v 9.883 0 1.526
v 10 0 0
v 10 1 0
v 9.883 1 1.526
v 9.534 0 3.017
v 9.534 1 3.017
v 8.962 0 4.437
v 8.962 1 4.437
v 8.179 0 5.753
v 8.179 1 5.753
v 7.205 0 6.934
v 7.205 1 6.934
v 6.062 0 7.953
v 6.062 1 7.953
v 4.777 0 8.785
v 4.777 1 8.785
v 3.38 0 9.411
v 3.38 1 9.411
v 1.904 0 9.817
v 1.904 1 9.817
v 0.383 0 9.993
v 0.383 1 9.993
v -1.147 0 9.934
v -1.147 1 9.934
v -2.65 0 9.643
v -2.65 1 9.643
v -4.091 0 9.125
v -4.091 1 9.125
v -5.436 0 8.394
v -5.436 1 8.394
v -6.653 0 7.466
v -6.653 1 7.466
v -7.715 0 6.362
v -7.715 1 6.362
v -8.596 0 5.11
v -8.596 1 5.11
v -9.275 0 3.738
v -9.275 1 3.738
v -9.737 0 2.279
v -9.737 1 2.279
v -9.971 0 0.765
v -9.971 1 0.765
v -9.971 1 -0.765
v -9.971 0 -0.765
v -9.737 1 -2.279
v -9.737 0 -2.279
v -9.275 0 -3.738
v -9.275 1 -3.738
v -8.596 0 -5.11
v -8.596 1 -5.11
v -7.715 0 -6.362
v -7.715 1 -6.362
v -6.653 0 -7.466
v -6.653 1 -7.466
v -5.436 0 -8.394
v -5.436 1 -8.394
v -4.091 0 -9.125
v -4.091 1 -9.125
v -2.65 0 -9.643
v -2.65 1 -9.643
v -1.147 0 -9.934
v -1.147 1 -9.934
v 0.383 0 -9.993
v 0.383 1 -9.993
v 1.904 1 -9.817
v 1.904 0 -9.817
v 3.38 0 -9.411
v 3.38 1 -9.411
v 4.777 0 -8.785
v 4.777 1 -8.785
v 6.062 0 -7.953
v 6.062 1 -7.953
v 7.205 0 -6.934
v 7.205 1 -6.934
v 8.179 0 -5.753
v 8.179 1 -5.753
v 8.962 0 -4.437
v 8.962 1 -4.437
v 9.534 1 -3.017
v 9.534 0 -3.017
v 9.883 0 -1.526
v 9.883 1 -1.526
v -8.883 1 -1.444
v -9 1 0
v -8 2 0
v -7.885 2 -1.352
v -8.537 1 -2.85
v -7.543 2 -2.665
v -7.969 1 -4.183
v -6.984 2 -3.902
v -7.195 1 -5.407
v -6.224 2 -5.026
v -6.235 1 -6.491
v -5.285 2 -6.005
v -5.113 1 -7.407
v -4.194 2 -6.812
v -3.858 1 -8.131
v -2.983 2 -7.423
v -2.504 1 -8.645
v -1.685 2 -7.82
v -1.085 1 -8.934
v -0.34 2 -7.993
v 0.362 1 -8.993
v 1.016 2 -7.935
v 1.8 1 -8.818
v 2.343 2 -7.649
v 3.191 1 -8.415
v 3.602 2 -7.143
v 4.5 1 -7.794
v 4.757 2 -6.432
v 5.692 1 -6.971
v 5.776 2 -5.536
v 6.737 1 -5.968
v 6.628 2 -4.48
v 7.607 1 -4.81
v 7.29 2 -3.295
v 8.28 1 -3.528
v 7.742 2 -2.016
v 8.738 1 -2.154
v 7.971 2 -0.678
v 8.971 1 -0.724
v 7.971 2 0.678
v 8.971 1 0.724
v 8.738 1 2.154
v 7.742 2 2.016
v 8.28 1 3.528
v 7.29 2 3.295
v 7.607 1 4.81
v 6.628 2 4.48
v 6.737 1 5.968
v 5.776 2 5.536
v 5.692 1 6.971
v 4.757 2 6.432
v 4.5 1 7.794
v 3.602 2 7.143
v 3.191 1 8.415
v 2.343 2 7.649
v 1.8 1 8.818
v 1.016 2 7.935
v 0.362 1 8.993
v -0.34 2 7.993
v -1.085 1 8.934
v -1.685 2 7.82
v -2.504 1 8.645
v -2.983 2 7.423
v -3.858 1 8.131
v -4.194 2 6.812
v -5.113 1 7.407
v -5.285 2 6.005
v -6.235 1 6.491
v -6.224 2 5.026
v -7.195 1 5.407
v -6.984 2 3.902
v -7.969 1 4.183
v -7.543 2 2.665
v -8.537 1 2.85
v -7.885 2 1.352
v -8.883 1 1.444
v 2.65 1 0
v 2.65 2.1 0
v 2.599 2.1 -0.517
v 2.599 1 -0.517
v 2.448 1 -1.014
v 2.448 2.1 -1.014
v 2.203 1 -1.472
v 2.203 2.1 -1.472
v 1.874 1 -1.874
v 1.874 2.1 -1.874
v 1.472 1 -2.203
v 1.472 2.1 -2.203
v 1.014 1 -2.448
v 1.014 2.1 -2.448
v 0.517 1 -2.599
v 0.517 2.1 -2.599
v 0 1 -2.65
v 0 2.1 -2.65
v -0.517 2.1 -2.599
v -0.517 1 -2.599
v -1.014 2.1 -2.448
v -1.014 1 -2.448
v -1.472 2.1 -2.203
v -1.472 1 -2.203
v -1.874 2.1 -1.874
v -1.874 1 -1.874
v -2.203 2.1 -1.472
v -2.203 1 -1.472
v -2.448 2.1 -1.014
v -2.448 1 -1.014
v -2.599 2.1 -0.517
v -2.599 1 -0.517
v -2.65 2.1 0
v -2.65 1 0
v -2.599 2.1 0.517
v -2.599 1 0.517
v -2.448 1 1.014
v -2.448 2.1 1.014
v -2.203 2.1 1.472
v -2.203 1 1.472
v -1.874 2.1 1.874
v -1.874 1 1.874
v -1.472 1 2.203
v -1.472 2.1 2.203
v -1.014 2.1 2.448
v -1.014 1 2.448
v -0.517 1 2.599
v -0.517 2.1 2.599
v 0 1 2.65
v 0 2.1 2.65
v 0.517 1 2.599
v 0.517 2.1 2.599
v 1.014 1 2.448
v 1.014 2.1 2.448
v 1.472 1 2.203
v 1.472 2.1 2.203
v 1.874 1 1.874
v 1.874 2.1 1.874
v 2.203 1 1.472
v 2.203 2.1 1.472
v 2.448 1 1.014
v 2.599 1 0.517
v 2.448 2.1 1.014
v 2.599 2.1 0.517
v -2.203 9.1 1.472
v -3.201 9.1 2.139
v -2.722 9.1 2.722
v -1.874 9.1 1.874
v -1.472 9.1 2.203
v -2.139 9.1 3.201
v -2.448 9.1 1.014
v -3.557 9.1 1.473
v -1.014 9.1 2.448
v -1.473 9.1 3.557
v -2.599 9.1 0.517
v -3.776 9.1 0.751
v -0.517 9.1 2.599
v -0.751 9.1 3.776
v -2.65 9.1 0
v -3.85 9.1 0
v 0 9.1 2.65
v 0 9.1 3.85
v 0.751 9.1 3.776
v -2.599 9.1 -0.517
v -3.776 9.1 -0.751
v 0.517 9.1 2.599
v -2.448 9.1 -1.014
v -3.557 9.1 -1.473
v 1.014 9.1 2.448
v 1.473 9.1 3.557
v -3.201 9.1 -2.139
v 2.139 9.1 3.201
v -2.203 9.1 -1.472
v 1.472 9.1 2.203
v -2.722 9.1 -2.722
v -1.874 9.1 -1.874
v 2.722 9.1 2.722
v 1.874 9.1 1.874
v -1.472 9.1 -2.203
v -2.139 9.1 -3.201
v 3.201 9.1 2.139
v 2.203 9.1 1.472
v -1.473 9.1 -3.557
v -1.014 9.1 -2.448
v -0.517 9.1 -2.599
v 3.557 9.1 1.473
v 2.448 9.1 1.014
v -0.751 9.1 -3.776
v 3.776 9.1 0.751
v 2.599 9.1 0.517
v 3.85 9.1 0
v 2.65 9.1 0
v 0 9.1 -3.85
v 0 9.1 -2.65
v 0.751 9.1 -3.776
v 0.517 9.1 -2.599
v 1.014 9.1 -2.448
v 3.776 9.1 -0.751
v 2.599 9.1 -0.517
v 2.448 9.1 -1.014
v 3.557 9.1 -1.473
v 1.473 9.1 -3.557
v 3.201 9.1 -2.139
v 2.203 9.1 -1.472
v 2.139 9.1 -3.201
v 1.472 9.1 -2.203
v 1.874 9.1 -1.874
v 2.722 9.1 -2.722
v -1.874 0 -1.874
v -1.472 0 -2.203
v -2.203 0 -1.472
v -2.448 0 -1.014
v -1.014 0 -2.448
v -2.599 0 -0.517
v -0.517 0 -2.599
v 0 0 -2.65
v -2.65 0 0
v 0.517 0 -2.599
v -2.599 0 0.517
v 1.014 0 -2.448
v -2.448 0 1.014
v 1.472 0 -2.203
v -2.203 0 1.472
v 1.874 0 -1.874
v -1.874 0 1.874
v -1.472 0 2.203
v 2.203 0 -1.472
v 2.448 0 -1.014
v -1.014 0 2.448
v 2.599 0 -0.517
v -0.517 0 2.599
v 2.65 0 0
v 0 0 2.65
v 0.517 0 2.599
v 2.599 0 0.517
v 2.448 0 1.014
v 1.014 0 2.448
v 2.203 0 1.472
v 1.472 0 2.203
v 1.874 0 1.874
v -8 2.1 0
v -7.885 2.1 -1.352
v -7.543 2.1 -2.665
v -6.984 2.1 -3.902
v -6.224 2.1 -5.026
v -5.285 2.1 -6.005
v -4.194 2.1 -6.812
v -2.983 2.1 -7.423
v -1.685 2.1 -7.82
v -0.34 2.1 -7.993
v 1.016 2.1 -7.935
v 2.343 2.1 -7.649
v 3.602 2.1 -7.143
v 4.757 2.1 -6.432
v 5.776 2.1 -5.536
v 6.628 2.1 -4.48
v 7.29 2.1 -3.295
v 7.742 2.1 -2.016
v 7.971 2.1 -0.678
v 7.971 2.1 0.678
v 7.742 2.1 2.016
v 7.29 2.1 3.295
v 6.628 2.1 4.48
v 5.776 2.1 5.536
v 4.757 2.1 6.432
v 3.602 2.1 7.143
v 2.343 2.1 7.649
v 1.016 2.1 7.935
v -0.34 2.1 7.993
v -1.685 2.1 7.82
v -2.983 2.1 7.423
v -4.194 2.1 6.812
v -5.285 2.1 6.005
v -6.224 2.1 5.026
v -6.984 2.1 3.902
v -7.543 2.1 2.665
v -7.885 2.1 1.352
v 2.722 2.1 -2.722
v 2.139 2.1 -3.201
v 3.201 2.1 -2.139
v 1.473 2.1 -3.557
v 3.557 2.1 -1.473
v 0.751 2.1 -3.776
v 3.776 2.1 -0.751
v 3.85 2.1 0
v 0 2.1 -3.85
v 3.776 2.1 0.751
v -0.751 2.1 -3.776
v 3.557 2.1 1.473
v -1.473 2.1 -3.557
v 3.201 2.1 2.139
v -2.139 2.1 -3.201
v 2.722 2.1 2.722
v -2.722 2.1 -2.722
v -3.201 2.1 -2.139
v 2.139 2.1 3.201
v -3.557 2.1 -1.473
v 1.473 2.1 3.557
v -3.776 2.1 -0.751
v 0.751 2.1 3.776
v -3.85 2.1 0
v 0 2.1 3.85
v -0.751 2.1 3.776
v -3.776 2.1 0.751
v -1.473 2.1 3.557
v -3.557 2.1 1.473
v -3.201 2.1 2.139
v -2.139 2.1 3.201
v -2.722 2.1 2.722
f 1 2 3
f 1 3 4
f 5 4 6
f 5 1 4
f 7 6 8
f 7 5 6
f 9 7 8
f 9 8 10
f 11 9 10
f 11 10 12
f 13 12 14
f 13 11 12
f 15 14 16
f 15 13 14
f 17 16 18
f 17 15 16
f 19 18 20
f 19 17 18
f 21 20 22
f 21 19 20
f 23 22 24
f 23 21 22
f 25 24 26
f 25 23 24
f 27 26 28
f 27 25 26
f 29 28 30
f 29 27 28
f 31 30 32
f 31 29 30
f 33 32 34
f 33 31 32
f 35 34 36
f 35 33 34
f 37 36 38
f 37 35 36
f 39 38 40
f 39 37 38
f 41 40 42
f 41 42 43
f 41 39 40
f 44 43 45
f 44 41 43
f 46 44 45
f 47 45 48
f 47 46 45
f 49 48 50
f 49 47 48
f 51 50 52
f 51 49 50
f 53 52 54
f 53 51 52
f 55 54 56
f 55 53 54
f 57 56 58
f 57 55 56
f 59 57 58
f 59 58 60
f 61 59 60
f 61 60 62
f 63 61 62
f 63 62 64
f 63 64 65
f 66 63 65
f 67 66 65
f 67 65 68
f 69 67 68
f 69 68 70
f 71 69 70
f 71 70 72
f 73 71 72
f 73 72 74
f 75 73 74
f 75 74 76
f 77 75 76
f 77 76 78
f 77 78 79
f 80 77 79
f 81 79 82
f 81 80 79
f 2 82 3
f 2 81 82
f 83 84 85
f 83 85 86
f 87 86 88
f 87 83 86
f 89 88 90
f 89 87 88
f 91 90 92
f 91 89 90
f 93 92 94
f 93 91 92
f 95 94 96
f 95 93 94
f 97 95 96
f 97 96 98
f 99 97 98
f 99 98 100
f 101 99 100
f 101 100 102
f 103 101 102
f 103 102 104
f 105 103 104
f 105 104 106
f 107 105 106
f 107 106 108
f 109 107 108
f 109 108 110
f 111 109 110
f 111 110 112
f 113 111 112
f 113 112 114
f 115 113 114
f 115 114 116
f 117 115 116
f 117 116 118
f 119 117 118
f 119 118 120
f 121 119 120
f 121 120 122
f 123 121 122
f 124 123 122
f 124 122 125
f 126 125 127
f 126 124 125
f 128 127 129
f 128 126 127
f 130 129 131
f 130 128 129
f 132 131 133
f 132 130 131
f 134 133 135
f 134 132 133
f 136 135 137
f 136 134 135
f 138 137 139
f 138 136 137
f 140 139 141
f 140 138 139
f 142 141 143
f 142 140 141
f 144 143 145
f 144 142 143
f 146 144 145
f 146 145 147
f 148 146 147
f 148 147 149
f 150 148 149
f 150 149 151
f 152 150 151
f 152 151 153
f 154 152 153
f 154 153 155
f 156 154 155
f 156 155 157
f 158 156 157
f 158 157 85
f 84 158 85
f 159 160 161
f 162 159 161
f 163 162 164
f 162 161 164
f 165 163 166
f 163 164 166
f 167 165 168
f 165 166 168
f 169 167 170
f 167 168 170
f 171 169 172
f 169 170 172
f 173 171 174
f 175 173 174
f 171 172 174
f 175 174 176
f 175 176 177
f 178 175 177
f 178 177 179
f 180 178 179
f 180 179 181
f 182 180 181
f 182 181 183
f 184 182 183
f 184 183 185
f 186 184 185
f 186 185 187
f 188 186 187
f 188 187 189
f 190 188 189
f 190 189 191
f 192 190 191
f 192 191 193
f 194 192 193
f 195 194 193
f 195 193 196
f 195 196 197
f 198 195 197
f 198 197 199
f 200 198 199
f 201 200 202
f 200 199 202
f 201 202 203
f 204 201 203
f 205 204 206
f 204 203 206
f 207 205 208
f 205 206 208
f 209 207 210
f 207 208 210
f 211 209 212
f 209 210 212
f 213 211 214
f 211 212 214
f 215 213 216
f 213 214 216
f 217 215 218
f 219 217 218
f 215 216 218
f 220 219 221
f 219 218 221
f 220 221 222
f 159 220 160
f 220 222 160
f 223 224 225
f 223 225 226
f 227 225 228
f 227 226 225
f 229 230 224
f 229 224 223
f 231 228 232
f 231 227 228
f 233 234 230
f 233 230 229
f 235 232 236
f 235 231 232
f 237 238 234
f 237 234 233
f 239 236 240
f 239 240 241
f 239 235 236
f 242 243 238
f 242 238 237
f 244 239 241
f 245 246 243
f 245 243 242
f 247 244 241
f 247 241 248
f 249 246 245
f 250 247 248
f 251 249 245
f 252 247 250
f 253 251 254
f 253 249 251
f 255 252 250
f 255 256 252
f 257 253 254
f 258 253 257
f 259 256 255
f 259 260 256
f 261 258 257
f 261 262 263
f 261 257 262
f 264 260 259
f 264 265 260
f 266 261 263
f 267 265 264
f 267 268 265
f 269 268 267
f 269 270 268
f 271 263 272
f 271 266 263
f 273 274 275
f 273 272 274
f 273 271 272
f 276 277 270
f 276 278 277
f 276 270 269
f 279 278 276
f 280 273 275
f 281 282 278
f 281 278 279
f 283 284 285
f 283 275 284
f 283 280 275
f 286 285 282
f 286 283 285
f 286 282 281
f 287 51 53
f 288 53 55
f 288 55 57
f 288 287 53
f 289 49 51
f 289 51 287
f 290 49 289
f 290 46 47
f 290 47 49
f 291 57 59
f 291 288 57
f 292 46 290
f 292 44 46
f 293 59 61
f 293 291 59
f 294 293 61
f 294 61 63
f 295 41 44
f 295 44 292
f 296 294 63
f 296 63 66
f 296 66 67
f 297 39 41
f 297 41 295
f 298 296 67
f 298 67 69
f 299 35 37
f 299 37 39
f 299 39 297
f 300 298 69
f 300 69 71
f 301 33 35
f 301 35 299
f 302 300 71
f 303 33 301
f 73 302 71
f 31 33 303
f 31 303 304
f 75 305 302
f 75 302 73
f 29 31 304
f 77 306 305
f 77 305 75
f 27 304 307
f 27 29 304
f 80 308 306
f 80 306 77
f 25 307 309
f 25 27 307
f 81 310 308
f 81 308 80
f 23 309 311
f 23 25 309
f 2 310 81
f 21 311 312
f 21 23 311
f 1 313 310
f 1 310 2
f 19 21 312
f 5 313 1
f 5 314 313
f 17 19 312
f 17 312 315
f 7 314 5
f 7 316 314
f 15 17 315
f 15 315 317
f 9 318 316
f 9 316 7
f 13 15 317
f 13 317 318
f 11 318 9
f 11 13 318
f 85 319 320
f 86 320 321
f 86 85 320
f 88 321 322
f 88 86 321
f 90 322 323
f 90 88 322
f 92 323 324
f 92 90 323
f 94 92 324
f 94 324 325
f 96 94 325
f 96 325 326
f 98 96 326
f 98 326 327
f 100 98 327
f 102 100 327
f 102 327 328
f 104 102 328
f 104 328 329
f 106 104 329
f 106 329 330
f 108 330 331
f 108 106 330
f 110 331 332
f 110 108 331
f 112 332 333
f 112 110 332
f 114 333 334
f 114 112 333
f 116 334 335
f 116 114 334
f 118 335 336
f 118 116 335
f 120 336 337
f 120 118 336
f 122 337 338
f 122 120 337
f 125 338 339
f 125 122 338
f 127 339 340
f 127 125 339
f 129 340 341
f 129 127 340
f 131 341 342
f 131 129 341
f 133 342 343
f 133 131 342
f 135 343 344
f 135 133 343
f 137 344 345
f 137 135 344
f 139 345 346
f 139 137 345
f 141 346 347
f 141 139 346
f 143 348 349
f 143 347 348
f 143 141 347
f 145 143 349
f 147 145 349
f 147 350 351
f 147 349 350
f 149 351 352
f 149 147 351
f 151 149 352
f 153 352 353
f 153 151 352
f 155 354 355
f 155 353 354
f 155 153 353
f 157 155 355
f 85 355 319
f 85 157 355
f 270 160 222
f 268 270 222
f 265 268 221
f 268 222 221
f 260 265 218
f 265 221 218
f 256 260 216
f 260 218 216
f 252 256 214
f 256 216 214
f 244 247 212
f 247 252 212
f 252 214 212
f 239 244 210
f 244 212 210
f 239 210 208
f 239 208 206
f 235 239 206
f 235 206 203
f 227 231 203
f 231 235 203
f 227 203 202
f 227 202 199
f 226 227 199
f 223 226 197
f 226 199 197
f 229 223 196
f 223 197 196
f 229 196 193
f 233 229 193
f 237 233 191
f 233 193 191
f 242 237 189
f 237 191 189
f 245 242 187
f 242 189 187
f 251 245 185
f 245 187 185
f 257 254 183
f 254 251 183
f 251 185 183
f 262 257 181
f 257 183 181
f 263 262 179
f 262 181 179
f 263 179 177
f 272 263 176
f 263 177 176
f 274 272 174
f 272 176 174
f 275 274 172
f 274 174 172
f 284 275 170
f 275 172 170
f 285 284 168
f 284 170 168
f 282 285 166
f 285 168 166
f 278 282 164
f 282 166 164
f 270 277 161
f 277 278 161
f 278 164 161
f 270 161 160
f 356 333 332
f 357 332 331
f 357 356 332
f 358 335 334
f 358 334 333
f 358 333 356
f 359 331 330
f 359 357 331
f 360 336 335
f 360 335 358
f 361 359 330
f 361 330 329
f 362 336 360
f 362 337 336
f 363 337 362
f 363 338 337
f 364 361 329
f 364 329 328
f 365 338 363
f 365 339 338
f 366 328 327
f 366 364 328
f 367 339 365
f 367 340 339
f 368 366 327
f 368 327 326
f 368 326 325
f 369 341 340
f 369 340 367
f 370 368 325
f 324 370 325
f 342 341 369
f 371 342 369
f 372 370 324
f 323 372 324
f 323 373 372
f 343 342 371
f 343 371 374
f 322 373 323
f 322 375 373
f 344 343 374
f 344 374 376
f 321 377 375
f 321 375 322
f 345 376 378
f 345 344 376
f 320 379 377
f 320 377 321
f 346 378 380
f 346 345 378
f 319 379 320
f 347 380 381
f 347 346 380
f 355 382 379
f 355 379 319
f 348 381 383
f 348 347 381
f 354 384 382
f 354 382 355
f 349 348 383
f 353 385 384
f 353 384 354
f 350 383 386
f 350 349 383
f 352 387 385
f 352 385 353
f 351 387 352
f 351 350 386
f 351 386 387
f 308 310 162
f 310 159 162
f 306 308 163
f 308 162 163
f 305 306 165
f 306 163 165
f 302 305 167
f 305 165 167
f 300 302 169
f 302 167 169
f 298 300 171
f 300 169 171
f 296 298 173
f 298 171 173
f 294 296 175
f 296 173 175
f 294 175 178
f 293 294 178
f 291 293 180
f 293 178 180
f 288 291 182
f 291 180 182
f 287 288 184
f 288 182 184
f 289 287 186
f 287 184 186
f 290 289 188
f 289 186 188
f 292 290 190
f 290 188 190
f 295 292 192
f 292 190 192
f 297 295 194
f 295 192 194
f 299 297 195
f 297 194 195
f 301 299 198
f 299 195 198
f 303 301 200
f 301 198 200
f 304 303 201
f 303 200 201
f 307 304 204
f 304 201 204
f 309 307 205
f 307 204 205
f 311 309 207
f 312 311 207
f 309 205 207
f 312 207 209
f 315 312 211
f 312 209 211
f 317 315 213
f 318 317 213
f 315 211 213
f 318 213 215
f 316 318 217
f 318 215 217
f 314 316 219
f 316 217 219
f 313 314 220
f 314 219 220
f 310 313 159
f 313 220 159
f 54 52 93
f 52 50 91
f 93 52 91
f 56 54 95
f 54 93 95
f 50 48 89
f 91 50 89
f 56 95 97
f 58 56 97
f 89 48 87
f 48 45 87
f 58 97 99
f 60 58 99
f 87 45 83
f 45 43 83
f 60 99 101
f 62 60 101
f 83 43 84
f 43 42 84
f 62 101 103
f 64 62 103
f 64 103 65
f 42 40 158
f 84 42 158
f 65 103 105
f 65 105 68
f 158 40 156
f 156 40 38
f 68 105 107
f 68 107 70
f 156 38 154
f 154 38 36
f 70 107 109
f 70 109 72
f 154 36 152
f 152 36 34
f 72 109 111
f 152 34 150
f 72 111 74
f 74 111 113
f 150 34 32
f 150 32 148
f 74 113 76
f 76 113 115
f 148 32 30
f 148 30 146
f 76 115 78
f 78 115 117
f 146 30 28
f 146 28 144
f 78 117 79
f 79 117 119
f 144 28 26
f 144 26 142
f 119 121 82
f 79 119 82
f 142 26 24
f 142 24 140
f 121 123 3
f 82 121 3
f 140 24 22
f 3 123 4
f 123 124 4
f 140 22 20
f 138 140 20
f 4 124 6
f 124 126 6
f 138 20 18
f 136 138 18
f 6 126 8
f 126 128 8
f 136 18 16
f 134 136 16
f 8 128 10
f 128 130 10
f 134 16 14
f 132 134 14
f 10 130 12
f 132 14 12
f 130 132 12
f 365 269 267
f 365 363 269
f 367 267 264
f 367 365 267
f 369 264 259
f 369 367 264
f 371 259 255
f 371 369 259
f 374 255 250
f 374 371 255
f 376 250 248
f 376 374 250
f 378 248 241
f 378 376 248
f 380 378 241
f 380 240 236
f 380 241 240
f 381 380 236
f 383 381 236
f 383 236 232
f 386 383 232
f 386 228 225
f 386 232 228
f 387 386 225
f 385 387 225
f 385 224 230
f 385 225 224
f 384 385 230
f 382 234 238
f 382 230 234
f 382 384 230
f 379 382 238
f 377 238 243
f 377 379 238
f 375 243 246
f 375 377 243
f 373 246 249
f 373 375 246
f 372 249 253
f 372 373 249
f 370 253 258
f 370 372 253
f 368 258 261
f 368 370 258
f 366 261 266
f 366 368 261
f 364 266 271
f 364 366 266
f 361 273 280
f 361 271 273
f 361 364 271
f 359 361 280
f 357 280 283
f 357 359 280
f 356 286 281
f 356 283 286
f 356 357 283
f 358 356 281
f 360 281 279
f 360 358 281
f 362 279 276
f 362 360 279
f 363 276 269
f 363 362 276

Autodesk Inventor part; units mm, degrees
ref_plane "YZ Plane" through (0, 0, 0) normal (1, 0, 0) x (0, 1, 0)
ref_plane "XZ Plane" through (0, 0, 0) normal (0, 1, 0) x (-1, 0, 0)
ref_plane "XY Plane" through (0, 0, 0) normal (0, 0, 1) x (1, 0, 0)
sketch "Boceto1" plane through (0, 0, 0) normal (0, 1, 0) x (-1, 0, 0)
  circle A0 centre (0, 0) radius 8
  dimension "d0" = 16
extrude "Extrusión1" add sketch "Boceto1" along normal blind 2.1
sketch "Boceto2" plane through (0, 2.1, 0) normal (0, 1, 0) x (1, 0, 0)
  circle A0 centre (0, 0) radius 2.65
  dimension "d3" = 5.3
extrude "Extrusión2" cut sketch "Boceto2" against normal through all
sketch "Boceto3" plane through (0, 2.1, 0) normal (0, 1, 0) x (1, 0, 0)
  circle A0 centre (0, 0) radius 3.85
  circle A1 centre (0, 0) radius 2.65 projected
  dimension "d6" = 7.7
extrude "Extrusión3" add sketch "Boceto3" along normal blind 7
sketch "Boceto4" plane through (0, 0, 0) normal (0, -1, 0) x (1, 0, 0)
  circle A0 centre (0, 0) radius 10
  dimension "d9" = 20
extrude "Extrusión4" add sketch "Boceto4" against normal blind 1
sketch "Boceto5" plane through (0, 1, 0) normal (0, 1, 0) x (1, 0, 0)
  circle A0 centre (0, 0) radius 2.65 projected
extrude "Extrusión5" cut sketch "Boceto5" against normal through all
chamfer "Chaflán2" distance 1 angle 45 1 edges at (8, 1, 0)
properties part number "elbowsupport"
